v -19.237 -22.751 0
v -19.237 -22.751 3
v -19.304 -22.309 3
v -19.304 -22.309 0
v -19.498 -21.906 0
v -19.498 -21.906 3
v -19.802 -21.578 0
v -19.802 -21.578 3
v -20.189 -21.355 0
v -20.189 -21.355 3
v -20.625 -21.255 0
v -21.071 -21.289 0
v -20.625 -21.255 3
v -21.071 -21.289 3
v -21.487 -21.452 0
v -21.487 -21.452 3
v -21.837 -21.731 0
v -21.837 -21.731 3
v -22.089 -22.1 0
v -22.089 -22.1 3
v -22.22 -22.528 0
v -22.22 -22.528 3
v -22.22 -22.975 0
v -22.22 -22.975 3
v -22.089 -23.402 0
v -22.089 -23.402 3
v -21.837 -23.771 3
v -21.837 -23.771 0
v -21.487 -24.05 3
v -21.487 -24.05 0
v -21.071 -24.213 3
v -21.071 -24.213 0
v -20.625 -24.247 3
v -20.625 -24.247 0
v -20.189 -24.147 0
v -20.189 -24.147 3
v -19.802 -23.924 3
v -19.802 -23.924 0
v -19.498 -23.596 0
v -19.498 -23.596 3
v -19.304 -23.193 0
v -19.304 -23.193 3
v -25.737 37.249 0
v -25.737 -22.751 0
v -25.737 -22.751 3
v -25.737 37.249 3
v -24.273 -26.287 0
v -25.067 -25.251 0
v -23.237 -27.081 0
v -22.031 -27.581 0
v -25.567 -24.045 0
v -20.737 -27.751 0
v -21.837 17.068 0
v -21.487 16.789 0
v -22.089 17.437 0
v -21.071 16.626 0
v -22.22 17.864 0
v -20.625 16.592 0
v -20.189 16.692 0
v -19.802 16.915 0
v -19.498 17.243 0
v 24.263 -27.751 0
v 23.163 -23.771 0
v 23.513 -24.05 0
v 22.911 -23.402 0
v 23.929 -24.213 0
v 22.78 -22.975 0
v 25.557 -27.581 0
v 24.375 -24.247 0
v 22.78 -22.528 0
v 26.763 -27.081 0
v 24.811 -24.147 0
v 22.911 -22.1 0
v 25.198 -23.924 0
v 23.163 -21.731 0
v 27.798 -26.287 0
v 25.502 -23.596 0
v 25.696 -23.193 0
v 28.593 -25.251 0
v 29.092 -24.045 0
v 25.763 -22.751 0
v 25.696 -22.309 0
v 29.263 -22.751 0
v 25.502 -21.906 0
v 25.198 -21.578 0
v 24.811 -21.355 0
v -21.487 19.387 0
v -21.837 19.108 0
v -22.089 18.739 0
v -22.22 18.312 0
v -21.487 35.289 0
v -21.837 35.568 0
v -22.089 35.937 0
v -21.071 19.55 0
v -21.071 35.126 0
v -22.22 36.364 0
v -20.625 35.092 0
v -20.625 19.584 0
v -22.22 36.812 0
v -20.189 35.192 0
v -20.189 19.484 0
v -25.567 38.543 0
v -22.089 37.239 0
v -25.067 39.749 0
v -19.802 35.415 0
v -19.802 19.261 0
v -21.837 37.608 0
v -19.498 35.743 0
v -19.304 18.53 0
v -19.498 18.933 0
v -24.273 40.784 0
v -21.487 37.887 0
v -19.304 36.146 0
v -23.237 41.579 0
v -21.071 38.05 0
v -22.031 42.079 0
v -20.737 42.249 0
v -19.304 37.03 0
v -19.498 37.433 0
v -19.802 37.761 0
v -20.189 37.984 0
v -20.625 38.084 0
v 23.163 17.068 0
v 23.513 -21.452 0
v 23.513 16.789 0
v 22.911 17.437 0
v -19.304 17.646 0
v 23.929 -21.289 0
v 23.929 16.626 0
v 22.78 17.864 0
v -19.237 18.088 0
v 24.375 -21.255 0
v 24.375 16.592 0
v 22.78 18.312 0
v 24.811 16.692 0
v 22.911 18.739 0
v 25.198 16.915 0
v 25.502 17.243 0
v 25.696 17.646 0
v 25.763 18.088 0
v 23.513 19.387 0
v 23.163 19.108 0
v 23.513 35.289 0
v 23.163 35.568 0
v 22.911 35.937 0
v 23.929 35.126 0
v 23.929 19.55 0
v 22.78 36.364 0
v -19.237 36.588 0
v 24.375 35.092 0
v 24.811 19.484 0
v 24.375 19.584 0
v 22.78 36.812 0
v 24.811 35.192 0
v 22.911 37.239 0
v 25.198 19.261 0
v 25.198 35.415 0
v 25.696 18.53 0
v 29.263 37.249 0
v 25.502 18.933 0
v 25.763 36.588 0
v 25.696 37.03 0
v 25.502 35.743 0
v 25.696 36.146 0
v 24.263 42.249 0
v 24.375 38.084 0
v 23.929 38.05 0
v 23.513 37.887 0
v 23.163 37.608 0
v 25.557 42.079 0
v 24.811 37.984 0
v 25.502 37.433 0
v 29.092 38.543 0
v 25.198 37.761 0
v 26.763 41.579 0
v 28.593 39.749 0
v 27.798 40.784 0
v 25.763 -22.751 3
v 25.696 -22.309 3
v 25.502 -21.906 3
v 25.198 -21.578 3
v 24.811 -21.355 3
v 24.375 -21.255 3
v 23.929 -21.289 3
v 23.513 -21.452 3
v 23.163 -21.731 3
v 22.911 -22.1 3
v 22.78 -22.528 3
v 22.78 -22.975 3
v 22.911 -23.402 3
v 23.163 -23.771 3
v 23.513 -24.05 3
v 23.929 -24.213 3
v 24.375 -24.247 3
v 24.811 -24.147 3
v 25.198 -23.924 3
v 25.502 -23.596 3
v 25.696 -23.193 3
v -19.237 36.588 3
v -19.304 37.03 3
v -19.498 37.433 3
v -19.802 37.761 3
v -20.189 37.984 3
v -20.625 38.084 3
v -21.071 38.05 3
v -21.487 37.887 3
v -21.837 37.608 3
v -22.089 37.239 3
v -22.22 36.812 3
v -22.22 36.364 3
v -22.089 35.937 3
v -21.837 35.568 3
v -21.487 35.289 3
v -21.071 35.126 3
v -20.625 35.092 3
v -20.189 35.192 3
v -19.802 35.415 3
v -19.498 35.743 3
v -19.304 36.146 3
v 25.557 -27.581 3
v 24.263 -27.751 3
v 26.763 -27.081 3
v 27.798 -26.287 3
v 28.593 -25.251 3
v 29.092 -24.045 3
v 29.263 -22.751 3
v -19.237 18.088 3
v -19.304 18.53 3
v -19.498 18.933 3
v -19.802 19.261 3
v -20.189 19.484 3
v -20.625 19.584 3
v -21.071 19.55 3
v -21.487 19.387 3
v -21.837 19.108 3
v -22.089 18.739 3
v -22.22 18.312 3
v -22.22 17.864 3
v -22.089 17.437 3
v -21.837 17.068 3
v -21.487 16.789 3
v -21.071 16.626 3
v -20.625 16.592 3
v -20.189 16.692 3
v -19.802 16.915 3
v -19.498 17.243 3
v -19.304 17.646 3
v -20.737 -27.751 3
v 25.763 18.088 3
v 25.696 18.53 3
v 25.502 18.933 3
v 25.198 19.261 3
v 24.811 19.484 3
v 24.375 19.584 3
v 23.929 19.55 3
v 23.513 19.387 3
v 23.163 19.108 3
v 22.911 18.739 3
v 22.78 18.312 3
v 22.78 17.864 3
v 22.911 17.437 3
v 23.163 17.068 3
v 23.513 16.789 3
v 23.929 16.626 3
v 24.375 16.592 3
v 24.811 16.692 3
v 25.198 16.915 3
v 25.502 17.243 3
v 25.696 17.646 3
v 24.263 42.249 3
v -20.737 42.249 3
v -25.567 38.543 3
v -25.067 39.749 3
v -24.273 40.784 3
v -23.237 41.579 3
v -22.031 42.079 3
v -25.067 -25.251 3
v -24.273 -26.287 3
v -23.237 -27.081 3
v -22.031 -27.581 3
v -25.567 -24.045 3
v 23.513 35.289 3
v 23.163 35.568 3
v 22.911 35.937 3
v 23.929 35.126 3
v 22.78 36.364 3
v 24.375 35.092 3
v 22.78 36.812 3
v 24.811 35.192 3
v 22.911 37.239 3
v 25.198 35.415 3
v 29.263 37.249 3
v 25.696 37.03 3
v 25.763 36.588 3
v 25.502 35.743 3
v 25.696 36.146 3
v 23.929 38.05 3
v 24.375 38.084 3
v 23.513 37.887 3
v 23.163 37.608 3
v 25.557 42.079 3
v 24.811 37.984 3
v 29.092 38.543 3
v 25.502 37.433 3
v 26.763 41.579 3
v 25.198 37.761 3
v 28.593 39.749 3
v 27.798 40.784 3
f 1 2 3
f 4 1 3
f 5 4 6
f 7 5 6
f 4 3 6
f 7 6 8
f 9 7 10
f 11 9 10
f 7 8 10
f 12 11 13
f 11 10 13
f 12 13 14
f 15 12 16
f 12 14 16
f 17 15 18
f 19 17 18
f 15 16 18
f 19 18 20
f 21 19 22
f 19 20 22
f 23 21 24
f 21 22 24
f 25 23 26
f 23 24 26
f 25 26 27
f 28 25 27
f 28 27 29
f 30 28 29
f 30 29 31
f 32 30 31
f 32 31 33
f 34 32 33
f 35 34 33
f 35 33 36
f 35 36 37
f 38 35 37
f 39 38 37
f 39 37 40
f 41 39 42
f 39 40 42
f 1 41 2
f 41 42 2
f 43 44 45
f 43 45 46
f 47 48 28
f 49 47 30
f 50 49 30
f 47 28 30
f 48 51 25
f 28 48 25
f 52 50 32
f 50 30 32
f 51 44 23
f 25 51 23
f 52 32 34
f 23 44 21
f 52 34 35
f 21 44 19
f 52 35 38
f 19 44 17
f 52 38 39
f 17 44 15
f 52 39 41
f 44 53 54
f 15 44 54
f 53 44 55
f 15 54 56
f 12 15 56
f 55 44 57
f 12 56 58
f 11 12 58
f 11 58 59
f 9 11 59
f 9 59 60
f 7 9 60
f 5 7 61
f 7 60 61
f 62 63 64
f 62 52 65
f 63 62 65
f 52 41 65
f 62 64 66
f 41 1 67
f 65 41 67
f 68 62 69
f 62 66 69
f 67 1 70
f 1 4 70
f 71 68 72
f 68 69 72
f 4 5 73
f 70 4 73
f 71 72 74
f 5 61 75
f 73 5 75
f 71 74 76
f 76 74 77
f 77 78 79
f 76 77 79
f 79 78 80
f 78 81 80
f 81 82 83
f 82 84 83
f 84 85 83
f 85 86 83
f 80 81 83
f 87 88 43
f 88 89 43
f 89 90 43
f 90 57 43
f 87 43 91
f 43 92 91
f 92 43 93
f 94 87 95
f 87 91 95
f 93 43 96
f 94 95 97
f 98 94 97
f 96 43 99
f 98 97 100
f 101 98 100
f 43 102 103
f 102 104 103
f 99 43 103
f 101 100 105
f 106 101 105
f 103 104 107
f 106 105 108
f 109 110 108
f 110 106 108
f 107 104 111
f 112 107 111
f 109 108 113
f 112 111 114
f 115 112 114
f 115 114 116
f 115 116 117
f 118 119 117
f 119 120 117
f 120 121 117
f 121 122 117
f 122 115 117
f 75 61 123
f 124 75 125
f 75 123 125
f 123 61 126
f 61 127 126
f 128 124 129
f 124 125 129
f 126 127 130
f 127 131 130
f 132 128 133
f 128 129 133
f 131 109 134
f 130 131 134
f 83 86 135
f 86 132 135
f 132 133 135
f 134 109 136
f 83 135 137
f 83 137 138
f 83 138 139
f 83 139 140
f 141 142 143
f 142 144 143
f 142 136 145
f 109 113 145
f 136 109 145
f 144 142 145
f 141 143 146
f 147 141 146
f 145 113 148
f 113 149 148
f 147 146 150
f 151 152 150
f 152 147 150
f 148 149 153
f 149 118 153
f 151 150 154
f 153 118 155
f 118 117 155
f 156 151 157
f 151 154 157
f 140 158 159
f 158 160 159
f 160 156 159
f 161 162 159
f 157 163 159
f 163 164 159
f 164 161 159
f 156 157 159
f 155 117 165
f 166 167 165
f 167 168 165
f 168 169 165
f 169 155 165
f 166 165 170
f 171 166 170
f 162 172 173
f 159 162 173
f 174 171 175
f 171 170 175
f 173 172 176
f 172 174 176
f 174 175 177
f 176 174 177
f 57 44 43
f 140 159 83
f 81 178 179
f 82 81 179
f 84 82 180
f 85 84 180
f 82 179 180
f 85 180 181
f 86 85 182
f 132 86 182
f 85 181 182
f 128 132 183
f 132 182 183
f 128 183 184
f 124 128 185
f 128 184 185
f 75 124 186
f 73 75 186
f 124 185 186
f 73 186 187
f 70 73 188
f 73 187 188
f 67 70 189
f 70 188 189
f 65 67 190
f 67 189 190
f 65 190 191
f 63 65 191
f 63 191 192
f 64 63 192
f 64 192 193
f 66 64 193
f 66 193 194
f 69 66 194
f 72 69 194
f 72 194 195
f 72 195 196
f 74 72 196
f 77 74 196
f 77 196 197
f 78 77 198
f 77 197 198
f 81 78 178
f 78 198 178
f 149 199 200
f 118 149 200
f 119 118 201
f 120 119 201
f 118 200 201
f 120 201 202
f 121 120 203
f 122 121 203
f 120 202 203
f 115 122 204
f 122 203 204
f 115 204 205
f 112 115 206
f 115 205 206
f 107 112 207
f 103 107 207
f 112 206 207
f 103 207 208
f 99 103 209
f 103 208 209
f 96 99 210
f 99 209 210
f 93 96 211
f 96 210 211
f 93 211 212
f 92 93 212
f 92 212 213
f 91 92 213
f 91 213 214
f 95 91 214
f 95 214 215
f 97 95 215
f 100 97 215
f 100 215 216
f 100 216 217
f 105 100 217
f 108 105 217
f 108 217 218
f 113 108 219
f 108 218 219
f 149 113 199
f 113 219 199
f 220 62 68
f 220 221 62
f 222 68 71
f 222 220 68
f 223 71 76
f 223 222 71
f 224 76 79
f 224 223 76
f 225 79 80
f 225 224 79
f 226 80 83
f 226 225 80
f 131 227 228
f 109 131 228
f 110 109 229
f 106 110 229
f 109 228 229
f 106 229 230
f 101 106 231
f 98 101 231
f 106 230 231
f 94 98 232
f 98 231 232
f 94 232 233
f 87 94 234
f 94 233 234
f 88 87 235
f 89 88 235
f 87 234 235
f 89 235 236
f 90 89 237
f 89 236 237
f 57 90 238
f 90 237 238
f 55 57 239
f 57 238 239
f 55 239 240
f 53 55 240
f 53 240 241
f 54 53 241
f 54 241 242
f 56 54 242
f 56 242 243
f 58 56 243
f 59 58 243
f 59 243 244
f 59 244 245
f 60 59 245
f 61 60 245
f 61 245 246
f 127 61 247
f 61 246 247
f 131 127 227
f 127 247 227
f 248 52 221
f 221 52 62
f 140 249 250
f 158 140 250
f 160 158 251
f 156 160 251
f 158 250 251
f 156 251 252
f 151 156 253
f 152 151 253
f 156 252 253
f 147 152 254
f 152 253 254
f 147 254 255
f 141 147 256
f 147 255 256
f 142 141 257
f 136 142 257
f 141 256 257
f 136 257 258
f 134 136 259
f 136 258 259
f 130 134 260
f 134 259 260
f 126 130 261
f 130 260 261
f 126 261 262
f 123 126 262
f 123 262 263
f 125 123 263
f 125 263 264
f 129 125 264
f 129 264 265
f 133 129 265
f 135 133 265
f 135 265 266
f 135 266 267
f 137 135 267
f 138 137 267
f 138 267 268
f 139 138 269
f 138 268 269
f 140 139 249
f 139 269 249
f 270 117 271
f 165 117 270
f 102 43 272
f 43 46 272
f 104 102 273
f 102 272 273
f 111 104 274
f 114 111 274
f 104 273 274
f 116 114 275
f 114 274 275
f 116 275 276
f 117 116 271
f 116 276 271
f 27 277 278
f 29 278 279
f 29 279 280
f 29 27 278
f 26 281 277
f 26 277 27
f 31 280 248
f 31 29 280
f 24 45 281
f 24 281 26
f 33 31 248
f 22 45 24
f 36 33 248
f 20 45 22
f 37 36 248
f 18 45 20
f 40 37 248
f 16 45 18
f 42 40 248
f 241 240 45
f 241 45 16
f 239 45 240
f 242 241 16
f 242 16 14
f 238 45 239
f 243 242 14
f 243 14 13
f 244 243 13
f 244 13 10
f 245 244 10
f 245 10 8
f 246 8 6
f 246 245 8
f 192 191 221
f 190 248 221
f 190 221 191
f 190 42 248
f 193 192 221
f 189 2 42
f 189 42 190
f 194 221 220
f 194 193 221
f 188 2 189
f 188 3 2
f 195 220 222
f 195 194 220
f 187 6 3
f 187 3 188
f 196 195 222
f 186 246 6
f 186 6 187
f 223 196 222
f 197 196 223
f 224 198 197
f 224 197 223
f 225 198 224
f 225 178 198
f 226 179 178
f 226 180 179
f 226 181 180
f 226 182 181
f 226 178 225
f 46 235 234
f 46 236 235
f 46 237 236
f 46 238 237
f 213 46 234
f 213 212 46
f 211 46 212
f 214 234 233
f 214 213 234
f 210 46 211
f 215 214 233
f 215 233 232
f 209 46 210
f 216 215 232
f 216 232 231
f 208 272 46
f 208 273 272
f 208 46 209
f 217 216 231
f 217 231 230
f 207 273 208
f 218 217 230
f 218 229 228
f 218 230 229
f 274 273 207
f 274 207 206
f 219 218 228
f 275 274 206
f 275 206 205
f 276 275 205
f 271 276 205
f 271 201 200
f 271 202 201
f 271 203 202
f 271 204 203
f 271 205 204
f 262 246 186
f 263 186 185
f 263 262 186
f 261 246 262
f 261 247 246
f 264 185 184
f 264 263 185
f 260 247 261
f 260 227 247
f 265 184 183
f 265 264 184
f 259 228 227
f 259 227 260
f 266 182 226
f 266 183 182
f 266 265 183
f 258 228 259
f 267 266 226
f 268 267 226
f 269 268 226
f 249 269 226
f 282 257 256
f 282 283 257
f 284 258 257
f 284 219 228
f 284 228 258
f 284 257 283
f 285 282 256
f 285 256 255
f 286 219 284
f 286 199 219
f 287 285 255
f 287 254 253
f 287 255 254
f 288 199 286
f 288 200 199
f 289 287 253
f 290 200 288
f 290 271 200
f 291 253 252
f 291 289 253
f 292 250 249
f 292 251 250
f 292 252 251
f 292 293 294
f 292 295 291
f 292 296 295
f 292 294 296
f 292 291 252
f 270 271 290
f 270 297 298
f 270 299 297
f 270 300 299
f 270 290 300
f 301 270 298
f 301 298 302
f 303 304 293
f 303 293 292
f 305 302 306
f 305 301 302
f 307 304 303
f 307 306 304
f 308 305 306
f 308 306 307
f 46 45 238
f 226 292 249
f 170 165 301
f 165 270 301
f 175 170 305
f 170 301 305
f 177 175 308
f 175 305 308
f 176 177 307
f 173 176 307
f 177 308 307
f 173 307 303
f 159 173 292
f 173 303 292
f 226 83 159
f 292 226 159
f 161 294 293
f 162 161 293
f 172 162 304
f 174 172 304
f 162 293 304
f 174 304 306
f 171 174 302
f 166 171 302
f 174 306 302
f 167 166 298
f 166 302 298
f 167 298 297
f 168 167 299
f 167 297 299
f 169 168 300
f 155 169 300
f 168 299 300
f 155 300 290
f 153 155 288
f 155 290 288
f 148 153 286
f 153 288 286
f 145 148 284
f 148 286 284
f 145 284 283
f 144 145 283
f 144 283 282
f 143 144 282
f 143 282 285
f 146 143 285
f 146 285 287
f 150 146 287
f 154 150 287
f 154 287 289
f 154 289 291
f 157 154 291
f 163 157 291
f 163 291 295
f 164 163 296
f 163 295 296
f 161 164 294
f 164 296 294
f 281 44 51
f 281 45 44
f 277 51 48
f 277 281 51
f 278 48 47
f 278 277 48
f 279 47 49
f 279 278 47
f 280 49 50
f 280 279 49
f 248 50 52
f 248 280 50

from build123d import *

# Parameters (mm, degrees)
SKETCH1_W           = 55
SKETCH1_H           = 70
BOSS_EXTRUDE1_DEPTH = 3
SKETCH2_R           = 1.5
CUT_EXTRUDE1_DEPTH  = 3
FILLET1_R           = 5


with BuildPart() as part:
    # Sketch1 → Boss-Extrude1 (new body)
    with BuildSketch(Plane.XY):
        with Locations((1.762820513, 7.248931624)):
            Rectangle(SKETCH1_W, SKETCH1_H)
    extrude(amount=BOSS_EXTRUDE1_DEPTH)

    # Sketch2 → Cut-Extrude1 (cut)
    with BuildSketch(Plane.XY.offset(3)):
        with Locations((-20.737179487, 36.587967336)):
            Circle(SKETCH2_R)
        with Locations((24.262820513, 36.587967336)):
            Circle(SKETCH2_R)
        with Locations((-20.737179487, 18.087967336)):
            Circle(SKETCH2_R)
        with Locations((24.262820513, 18.087967336)):
            Circle(SKETCH2_R)
        with Locations((-20.737179487, -22.751068376)):
            Circle(SKETCH2_R)
        with Locations((24.262820513, -22.751068376)):
            Circle(SKETCH2_R)
    extrude(amount=-CUT_EXTRUDE1_DEPTH, mode=Mode.SUBTRACT)

    # Fillet1
    fillet1_edges = [part.edges().sort_by_distance(p)[0] for p in [
        (-25.737179487, 42.248931624, 1.5),
        (29.262820513, 42.248931624, 1.5),
        (29.262820513, -27.751068376, 1.5),
        (-25.737179487, -27.751068376, 1.5),
    ]]
    fillet(fillet1_edges, radius=FILLET1_R)


solid = part.part
